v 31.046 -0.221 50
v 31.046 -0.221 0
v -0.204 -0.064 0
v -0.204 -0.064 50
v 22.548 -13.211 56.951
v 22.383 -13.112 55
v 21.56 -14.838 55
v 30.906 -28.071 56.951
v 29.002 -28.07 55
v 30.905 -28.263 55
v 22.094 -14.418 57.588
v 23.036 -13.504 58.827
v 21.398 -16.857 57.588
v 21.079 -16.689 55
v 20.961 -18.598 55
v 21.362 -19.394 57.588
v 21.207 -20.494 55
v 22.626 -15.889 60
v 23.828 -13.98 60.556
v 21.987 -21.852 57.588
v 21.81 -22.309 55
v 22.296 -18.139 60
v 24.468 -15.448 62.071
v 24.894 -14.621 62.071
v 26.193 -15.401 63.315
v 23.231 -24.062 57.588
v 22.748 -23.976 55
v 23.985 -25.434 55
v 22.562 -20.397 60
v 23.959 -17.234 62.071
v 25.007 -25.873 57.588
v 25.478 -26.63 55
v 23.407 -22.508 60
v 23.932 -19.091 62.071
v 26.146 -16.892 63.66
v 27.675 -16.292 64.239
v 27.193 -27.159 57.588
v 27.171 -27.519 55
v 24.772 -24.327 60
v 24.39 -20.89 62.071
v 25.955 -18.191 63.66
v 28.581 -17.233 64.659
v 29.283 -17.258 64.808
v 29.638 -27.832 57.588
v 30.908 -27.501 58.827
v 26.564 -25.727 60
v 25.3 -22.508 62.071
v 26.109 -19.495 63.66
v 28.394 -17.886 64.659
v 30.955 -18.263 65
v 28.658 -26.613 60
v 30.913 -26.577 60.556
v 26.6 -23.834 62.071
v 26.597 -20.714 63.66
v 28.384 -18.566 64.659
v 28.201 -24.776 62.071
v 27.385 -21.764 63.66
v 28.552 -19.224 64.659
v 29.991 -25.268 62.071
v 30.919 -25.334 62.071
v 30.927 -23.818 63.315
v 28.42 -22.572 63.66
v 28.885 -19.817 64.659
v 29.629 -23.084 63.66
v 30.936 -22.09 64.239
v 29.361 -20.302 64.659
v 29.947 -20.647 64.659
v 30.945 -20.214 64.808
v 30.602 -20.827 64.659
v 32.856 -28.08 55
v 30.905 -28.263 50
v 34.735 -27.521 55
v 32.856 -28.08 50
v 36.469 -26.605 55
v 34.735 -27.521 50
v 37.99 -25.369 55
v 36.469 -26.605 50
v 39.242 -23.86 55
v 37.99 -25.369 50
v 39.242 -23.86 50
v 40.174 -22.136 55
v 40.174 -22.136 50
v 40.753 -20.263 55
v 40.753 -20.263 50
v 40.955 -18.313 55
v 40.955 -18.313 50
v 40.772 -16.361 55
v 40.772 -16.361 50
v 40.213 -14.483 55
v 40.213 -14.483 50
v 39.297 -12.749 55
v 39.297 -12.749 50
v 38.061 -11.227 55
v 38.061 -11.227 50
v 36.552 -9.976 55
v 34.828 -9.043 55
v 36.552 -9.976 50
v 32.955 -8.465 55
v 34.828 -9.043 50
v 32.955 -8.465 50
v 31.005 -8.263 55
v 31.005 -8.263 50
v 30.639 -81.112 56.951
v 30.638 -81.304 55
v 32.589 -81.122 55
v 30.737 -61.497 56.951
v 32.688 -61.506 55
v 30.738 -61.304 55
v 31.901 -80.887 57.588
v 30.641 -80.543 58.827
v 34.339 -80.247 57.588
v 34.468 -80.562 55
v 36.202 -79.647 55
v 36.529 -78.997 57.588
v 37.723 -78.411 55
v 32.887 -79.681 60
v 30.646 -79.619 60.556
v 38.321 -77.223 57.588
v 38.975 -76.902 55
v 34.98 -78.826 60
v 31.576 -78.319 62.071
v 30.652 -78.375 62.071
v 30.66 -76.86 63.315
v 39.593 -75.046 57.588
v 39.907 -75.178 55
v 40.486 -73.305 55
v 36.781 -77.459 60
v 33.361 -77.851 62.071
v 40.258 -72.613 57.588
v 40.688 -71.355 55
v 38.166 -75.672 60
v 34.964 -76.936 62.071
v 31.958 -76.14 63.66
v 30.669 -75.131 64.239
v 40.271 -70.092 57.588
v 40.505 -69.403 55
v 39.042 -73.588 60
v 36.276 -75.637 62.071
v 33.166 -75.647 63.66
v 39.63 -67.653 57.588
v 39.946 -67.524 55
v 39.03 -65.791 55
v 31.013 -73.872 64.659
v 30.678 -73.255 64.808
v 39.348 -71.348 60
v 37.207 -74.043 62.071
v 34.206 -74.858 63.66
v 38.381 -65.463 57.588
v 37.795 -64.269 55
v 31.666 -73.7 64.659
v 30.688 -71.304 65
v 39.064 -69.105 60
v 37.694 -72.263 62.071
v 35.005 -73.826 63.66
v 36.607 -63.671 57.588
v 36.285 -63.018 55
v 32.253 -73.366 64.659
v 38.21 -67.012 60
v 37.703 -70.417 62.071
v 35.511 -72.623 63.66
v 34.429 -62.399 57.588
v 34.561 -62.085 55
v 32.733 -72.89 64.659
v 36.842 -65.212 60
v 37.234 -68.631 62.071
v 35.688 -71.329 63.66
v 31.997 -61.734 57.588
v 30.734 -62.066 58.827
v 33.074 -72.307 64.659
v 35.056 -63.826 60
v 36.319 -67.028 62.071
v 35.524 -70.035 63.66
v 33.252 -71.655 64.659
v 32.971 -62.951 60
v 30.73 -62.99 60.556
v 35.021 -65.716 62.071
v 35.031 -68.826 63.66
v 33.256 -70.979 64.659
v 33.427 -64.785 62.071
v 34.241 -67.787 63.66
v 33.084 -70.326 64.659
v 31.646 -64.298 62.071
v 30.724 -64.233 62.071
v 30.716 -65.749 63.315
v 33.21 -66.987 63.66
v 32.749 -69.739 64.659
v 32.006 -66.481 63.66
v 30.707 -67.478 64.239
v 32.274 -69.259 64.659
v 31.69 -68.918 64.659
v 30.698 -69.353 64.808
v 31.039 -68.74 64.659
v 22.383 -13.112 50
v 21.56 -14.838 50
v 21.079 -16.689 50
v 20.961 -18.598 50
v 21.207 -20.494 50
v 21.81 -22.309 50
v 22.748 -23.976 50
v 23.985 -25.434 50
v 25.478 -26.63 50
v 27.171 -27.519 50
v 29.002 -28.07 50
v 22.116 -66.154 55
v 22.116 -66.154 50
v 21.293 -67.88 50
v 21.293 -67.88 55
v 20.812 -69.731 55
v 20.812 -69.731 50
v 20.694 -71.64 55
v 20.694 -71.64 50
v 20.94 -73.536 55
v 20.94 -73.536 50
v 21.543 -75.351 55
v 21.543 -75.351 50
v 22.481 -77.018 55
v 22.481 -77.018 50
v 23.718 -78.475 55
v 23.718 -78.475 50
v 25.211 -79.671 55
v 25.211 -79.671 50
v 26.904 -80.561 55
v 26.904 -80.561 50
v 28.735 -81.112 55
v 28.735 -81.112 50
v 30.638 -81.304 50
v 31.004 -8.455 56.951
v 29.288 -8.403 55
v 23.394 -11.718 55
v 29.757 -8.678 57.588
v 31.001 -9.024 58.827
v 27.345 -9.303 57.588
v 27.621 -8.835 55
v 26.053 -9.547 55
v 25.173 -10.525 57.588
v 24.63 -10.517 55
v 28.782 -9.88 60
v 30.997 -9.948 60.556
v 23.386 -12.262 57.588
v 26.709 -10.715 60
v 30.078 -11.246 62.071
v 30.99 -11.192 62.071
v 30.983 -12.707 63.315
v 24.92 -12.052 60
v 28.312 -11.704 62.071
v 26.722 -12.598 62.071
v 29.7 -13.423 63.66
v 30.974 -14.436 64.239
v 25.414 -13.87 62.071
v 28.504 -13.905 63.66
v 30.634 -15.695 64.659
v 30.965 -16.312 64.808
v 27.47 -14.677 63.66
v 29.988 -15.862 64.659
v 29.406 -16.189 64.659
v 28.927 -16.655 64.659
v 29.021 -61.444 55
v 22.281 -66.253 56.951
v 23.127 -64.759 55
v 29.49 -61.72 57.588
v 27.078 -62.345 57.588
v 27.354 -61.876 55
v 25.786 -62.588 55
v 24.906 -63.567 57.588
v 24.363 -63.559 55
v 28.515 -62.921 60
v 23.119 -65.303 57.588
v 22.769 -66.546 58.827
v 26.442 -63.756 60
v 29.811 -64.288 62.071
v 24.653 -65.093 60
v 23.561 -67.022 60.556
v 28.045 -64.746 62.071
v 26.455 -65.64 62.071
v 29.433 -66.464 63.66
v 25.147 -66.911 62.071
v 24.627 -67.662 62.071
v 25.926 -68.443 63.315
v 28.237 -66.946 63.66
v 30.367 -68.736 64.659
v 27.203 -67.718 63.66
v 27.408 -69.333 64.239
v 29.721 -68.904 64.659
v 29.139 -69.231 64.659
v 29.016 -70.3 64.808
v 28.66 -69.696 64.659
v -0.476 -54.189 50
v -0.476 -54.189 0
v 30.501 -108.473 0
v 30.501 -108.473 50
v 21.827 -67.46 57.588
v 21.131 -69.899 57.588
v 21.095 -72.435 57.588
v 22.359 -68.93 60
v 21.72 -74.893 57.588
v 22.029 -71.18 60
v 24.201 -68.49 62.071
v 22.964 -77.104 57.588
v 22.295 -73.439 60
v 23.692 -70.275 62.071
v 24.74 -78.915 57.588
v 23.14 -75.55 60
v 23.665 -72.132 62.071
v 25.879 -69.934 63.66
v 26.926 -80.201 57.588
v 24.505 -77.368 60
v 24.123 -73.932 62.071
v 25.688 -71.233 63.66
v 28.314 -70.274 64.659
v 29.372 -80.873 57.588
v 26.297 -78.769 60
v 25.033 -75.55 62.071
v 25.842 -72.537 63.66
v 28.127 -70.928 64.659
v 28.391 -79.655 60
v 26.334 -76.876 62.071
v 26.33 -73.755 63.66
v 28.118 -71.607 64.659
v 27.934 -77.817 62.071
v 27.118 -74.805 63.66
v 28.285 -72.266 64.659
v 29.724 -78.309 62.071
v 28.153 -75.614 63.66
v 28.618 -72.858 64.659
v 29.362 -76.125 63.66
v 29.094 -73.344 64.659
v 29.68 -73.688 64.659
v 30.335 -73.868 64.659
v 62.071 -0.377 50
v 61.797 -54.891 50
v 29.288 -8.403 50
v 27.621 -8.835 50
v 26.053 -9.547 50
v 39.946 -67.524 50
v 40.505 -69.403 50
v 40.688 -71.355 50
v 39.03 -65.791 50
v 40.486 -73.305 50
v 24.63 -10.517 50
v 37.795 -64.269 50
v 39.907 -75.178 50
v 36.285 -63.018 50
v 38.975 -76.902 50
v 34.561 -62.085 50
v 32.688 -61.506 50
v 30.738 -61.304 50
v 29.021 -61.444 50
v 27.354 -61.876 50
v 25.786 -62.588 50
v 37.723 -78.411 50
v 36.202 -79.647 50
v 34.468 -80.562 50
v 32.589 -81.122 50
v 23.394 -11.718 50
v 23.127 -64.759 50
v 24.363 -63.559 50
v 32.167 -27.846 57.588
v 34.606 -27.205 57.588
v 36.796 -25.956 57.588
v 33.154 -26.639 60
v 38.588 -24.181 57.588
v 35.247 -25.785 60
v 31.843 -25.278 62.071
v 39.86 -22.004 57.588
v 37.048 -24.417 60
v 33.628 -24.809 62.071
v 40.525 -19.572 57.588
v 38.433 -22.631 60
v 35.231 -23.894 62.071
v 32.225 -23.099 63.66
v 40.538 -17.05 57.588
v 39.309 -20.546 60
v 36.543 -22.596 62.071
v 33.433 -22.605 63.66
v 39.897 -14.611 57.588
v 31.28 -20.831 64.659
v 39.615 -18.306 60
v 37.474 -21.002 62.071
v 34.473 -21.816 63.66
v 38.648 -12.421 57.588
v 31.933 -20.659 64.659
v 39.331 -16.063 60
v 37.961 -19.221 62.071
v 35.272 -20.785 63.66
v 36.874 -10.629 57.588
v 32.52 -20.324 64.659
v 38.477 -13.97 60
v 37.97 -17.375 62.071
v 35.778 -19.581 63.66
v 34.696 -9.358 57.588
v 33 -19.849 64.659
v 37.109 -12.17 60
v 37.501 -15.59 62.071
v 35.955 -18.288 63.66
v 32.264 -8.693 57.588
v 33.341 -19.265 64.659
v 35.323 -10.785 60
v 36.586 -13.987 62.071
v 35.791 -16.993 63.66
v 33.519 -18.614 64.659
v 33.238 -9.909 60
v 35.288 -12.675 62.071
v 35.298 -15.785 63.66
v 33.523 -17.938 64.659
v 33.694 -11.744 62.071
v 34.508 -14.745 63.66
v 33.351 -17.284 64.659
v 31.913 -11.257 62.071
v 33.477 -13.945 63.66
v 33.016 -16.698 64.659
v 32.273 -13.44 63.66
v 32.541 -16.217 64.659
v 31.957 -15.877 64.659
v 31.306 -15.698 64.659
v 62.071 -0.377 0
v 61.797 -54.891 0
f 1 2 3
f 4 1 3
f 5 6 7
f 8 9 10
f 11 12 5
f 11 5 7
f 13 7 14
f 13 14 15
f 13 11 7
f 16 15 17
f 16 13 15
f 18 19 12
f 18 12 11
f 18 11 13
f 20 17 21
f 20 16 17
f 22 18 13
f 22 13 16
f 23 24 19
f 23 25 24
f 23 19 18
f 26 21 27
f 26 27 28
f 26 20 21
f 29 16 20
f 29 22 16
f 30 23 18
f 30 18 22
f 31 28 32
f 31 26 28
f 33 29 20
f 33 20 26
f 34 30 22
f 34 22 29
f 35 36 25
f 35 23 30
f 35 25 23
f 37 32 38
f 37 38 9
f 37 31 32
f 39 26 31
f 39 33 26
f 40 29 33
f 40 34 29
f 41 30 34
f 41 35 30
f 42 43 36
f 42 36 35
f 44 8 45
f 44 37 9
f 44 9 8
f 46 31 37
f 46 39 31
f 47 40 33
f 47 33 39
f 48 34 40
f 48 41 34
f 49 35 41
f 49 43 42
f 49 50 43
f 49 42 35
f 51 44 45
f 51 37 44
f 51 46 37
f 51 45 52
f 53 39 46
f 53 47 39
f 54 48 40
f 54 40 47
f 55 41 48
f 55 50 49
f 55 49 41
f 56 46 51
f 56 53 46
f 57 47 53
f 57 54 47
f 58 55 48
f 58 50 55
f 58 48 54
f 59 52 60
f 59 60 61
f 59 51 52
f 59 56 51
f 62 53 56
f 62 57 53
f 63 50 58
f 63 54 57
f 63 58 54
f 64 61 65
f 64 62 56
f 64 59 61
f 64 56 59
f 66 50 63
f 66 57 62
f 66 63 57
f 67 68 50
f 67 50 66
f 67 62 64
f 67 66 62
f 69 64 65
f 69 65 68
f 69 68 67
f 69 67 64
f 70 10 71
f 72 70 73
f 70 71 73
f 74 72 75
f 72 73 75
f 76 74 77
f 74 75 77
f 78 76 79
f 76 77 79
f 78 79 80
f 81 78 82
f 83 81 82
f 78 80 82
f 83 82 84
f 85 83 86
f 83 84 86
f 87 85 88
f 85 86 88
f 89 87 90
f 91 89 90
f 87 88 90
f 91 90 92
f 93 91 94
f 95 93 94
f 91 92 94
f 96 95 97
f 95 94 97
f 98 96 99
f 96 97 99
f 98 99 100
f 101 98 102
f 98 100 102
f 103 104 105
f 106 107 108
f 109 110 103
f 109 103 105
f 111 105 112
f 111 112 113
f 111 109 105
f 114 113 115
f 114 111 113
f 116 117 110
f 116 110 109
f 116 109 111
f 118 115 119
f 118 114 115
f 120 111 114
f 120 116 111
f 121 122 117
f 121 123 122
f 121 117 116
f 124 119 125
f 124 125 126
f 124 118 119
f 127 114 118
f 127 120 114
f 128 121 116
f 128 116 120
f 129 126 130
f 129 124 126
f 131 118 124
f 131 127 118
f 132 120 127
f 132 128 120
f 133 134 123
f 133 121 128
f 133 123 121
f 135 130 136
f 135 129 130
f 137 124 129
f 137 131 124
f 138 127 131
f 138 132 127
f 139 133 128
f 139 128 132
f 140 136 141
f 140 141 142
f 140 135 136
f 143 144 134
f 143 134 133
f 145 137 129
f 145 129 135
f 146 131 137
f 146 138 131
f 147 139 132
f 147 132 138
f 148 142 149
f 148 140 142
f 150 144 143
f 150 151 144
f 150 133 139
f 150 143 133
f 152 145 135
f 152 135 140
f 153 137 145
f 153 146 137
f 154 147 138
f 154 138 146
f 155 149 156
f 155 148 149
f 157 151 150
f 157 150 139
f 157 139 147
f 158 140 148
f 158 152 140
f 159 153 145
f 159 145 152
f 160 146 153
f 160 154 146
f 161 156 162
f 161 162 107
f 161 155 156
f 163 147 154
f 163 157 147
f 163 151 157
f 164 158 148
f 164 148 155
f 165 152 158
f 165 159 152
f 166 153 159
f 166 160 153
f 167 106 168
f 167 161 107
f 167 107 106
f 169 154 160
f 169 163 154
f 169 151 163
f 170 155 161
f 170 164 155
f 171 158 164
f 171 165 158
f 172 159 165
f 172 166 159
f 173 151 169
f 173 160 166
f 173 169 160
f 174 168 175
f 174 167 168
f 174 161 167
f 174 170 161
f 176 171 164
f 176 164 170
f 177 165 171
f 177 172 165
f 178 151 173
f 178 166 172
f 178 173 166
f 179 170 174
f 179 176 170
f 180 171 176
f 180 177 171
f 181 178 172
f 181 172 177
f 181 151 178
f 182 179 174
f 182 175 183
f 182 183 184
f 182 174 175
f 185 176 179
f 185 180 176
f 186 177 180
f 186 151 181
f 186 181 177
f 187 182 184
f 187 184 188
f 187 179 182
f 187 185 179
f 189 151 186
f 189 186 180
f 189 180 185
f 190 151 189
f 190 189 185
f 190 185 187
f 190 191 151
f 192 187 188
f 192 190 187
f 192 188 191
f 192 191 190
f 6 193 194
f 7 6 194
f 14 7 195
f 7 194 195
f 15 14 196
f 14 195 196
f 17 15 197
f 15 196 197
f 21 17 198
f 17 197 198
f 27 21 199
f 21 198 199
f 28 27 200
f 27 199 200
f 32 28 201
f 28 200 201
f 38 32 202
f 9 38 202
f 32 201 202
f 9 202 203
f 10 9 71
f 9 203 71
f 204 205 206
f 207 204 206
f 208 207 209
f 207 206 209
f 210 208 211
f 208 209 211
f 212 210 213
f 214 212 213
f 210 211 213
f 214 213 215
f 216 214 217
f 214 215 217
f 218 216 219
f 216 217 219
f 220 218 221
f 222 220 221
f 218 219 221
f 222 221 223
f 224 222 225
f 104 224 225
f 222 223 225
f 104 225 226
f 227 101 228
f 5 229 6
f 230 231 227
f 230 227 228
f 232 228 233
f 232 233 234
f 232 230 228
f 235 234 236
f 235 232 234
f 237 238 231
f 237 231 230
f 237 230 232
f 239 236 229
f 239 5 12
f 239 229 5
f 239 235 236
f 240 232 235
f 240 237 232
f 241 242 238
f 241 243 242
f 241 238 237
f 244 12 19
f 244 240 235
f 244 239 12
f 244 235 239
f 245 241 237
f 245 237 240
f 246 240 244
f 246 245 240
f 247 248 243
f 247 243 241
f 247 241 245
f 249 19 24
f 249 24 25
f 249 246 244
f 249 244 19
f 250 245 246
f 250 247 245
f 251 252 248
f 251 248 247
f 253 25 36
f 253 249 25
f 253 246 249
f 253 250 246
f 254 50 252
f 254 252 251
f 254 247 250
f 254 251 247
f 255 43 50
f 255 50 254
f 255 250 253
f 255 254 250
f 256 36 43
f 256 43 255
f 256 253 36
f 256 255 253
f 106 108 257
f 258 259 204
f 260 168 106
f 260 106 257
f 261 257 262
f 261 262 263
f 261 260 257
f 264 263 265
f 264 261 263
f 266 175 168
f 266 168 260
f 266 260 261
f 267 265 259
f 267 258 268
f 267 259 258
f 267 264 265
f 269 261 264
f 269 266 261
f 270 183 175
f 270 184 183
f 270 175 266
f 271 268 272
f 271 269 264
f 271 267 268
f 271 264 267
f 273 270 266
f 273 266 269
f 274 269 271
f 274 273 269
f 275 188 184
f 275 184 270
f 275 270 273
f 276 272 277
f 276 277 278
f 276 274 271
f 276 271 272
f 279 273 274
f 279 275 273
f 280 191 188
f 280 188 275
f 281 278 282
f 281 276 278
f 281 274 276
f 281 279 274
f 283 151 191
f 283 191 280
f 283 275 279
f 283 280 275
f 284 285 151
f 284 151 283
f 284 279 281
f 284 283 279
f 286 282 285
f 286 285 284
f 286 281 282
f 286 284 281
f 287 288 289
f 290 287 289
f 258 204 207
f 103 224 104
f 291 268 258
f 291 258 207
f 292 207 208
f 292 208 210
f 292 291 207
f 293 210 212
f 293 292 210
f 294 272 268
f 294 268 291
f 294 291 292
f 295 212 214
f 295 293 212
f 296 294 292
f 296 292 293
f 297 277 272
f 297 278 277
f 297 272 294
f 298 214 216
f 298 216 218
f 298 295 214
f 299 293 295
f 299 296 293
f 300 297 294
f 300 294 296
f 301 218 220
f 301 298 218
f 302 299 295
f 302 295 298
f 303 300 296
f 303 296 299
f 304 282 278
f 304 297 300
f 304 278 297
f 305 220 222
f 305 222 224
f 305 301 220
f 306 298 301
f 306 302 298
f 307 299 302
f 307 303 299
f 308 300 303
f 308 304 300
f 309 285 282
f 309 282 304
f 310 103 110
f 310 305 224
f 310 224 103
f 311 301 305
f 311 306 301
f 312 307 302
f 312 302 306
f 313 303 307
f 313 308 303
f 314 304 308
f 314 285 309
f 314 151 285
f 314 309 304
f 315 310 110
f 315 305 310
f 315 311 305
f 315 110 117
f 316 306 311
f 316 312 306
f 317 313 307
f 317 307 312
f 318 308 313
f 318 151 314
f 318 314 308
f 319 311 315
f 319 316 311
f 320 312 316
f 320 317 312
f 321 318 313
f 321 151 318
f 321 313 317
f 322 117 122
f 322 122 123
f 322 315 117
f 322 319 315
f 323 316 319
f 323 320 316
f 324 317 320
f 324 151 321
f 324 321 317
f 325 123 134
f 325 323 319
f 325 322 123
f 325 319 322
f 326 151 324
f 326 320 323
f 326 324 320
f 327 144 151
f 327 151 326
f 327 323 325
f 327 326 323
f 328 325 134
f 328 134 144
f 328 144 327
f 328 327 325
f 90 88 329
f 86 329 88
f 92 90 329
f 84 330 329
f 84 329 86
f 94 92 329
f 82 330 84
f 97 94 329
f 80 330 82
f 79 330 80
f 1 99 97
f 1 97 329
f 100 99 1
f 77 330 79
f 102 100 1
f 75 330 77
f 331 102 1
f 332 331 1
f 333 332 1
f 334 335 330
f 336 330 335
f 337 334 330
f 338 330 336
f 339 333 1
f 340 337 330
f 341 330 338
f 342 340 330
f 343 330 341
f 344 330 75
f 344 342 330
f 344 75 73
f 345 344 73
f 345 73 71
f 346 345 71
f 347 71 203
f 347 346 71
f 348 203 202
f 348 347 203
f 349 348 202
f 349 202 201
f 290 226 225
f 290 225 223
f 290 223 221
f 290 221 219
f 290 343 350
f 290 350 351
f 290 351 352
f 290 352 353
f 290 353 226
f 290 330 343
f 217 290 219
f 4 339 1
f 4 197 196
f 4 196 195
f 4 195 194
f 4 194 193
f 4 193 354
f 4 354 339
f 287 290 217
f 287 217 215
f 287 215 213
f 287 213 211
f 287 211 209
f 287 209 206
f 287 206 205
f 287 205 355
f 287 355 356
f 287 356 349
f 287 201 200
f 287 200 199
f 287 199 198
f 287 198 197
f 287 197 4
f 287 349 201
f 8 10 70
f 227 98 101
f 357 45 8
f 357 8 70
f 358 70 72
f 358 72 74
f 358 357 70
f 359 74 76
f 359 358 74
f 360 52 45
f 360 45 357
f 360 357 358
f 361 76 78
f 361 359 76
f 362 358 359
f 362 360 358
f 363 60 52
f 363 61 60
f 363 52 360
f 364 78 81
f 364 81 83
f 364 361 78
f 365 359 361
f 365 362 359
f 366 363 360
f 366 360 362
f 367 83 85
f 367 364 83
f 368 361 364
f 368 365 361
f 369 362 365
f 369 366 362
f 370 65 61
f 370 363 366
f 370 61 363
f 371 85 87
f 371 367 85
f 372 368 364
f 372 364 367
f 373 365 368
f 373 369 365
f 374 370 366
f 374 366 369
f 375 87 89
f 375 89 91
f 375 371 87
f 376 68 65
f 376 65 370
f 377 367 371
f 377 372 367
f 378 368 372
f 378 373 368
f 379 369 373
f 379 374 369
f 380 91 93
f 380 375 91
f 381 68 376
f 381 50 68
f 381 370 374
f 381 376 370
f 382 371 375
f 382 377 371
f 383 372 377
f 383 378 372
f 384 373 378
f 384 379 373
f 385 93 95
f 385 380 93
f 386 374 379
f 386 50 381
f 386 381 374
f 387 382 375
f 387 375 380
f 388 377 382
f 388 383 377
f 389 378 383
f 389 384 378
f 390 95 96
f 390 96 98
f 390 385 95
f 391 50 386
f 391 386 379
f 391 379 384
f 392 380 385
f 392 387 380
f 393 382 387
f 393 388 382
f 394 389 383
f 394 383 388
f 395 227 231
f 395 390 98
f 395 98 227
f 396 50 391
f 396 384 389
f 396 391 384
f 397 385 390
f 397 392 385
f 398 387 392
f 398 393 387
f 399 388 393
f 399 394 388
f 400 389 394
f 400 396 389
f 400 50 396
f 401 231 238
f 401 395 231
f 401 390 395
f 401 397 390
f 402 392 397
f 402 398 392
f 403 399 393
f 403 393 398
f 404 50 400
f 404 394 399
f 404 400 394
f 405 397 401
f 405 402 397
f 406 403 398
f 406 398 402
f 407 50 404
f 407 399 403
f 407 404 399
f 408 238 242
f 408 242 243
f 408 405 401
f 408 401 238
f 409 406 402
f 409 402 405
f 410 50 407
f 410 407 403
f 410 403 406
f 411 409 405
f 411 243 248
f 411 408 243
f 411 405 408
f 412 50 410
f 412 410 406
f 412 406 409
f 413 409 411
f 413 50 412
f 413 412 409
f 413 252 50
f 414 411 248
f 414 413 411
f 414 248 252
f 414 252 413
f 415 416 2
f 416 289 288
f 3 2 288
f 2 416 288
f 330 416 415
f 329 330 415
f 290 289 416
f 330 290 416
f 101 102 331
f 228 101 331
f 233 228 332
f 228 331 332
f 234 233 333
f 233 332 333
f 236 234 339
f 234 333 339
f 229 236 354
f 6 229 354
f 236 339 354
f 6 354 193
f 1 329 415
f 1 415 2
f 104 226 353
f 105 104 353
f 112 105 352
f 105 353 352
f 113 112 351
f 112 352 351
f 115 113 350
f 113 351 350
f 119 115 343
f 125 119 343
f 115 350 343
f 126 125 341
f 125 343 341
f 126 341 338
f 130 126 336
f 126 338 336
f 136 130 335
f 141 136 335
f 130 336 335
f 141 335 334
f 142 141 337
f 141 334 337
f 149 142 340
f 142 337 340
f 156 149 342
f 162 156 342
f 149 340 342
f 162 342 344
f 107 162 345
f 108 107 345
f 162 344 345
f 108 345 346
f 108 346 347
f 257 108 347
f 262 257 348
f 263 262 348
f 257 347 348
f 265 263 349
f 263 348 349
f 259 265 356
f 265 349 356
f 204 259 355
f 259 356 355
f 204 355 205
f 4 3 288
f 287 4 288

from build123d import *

# Parameters (mm, degrees)
F1_DEPTH = 50
F2_DEPTH = 65
F3_R     = 10
F5_ANGLE = -149


with BuildPart() as f1:
    # F0 (on Top) → F1 (new body)
    with BuildSketch(Plane.XY):
        with BuildLine():
            Line((17.6526700227, 31.4716789257), (-36.8578768761, 62.0470002943))
            Line((-36.8578768761, 62.0470002943), (-22.982297547, 38.6886805081))
            ThreePointArc((-22.982297547, 38.6886805081), (-12.9289992244, 38.7823343206), (-7.8751203144, 30.0911959508))
            ThreePointArc((-7.8751203144, 30.0911959508), (-9.1839819445, 25.1450748608), (-12.7679430817, 21.4937113934))
            Line((-12.7679430817, 21.4937113934), (0, 0))
            Line((0, 0), (4.1072919863, -6.9142655162))
            ThreePointArc((4.1072919863, -6.9142655162), (14.160590309, -6.8206117038), (19.214469219, -15.5117500736))
            ThreePointArc((19.214469219, -15.5117500736), (17.9056075888, -20.4578711635), (14.3216464517, -24.1092346309))
            Line((14.3216464517, -24.1092346309), (18.428938438, -31.0235001472))
            Line((18.428938438, -31.0235001472), (45.2960776798, -15.063571295))
            Line((45.2960776798, -15.063571295), (17.6526700227, 31.4716789257))
        make_face()
        with BuildLine():
            Line((-22.982297547, 38.6886805081), (-36.8578768761, 62.0470002943))
            Line((-36.8578768761, 62.0470002943), (-36.0871754027, 0))
            Line((-36.0871754027, 0), (-8.2455254354, -46.8689737481))
            Line((-8.2455254354, -46.8689737481), (18.428938438, -31.0235001472))
            Line((18.428938438, -31.0235001472), (14.3216464517, -24.1092346309))
            ThreePointArc((14.3216464517, -24.1092346309), (0.6169846617, -20.6189273063), (4.1072919863, -6.9142655162))
            Line((4.1072919863, -6.9142655162), (0, 0))
            Line((0, 0), (-12.7679430817, 21.4937113934))
            ThreePointArc((-12.7679430817, 21.4937113934), (-26.4726048717, 24.9840187181), (-22.982297547, 38.6886805081))
        make_face()
    extrude(amount=F1_DEPTH)

    # F0 (on Top) → F2 (join)
    with BuildSketch(Plane.XY):
        with BuildLine():
            ThreePointArc((-7.8751203144, 30.0911959508), (-12.9289992244, 38.7823343206), (-22.982297547, 38.6886805081))
            Line((-22.982297547, 38.6886805081), (-12.7679430817, 21.4937113934))
            ThreePointArc((-12.7679430817, 21.4937113934), (-9.1839819445, 25.1450748608), (-7.8751203144, 30.0911959508))
        make_face()
        with BuildLine():
            Line((-12.7679430817, 21.4937113934), (-22.982297547, 38.6886805081))
            ThreePointArc((-22.982297547, 38.6886805081), (-26.4726048717, 24.9840187181), (-12.7679430817, 21.4937113934))
        make_face()
        with BuildLine():
            Line((14.3216464517, -24.1092346309), (4.1072919863, -6.9142655162))
            ThreePointArc((4.1072919863, -6.9142655162), (0.6169846617, -20.6189273063), (14.3216464517, -24.1092346309))
        make_face()
        with BuildLine():
            ThreePointArc((19.214469219, -15.5117500736), (14.160590309, -6.8206117038), (4.1072919863, -6.9142655162))
            Line((4.1072919863, -6.9142655162), (14.3216464517, -24.1092346309))
            ThreePointArc((14.3216464517, -24.1092346309), (17.9056075888, -20.4578711635), (19.214469219, -15.5117500736))
        make_face()
    extrude(amount=F2_DEPTH)

    # F3
    f3_edges = [f1.edges().sort_by_distance(p)[0] for p in [
        (-27.87512, 30.091196, 65),
        (4.107292, -6.914266, 65),
    ]]
    fillet(f3_edges, radius=F3_R)


with BuildPart() as f1_1:
    # F4: moved
    add(f1.part.moved(Location((-45.5, 15, 0))))


with BuildPart() as f1_2:
    # F5: moved
    add(f1_1.part.rotate(Axis((-0.2039223202, -0.063571295, 25), (0, 0, -1)), F5_ANGLE))


solid = f1_2.part
